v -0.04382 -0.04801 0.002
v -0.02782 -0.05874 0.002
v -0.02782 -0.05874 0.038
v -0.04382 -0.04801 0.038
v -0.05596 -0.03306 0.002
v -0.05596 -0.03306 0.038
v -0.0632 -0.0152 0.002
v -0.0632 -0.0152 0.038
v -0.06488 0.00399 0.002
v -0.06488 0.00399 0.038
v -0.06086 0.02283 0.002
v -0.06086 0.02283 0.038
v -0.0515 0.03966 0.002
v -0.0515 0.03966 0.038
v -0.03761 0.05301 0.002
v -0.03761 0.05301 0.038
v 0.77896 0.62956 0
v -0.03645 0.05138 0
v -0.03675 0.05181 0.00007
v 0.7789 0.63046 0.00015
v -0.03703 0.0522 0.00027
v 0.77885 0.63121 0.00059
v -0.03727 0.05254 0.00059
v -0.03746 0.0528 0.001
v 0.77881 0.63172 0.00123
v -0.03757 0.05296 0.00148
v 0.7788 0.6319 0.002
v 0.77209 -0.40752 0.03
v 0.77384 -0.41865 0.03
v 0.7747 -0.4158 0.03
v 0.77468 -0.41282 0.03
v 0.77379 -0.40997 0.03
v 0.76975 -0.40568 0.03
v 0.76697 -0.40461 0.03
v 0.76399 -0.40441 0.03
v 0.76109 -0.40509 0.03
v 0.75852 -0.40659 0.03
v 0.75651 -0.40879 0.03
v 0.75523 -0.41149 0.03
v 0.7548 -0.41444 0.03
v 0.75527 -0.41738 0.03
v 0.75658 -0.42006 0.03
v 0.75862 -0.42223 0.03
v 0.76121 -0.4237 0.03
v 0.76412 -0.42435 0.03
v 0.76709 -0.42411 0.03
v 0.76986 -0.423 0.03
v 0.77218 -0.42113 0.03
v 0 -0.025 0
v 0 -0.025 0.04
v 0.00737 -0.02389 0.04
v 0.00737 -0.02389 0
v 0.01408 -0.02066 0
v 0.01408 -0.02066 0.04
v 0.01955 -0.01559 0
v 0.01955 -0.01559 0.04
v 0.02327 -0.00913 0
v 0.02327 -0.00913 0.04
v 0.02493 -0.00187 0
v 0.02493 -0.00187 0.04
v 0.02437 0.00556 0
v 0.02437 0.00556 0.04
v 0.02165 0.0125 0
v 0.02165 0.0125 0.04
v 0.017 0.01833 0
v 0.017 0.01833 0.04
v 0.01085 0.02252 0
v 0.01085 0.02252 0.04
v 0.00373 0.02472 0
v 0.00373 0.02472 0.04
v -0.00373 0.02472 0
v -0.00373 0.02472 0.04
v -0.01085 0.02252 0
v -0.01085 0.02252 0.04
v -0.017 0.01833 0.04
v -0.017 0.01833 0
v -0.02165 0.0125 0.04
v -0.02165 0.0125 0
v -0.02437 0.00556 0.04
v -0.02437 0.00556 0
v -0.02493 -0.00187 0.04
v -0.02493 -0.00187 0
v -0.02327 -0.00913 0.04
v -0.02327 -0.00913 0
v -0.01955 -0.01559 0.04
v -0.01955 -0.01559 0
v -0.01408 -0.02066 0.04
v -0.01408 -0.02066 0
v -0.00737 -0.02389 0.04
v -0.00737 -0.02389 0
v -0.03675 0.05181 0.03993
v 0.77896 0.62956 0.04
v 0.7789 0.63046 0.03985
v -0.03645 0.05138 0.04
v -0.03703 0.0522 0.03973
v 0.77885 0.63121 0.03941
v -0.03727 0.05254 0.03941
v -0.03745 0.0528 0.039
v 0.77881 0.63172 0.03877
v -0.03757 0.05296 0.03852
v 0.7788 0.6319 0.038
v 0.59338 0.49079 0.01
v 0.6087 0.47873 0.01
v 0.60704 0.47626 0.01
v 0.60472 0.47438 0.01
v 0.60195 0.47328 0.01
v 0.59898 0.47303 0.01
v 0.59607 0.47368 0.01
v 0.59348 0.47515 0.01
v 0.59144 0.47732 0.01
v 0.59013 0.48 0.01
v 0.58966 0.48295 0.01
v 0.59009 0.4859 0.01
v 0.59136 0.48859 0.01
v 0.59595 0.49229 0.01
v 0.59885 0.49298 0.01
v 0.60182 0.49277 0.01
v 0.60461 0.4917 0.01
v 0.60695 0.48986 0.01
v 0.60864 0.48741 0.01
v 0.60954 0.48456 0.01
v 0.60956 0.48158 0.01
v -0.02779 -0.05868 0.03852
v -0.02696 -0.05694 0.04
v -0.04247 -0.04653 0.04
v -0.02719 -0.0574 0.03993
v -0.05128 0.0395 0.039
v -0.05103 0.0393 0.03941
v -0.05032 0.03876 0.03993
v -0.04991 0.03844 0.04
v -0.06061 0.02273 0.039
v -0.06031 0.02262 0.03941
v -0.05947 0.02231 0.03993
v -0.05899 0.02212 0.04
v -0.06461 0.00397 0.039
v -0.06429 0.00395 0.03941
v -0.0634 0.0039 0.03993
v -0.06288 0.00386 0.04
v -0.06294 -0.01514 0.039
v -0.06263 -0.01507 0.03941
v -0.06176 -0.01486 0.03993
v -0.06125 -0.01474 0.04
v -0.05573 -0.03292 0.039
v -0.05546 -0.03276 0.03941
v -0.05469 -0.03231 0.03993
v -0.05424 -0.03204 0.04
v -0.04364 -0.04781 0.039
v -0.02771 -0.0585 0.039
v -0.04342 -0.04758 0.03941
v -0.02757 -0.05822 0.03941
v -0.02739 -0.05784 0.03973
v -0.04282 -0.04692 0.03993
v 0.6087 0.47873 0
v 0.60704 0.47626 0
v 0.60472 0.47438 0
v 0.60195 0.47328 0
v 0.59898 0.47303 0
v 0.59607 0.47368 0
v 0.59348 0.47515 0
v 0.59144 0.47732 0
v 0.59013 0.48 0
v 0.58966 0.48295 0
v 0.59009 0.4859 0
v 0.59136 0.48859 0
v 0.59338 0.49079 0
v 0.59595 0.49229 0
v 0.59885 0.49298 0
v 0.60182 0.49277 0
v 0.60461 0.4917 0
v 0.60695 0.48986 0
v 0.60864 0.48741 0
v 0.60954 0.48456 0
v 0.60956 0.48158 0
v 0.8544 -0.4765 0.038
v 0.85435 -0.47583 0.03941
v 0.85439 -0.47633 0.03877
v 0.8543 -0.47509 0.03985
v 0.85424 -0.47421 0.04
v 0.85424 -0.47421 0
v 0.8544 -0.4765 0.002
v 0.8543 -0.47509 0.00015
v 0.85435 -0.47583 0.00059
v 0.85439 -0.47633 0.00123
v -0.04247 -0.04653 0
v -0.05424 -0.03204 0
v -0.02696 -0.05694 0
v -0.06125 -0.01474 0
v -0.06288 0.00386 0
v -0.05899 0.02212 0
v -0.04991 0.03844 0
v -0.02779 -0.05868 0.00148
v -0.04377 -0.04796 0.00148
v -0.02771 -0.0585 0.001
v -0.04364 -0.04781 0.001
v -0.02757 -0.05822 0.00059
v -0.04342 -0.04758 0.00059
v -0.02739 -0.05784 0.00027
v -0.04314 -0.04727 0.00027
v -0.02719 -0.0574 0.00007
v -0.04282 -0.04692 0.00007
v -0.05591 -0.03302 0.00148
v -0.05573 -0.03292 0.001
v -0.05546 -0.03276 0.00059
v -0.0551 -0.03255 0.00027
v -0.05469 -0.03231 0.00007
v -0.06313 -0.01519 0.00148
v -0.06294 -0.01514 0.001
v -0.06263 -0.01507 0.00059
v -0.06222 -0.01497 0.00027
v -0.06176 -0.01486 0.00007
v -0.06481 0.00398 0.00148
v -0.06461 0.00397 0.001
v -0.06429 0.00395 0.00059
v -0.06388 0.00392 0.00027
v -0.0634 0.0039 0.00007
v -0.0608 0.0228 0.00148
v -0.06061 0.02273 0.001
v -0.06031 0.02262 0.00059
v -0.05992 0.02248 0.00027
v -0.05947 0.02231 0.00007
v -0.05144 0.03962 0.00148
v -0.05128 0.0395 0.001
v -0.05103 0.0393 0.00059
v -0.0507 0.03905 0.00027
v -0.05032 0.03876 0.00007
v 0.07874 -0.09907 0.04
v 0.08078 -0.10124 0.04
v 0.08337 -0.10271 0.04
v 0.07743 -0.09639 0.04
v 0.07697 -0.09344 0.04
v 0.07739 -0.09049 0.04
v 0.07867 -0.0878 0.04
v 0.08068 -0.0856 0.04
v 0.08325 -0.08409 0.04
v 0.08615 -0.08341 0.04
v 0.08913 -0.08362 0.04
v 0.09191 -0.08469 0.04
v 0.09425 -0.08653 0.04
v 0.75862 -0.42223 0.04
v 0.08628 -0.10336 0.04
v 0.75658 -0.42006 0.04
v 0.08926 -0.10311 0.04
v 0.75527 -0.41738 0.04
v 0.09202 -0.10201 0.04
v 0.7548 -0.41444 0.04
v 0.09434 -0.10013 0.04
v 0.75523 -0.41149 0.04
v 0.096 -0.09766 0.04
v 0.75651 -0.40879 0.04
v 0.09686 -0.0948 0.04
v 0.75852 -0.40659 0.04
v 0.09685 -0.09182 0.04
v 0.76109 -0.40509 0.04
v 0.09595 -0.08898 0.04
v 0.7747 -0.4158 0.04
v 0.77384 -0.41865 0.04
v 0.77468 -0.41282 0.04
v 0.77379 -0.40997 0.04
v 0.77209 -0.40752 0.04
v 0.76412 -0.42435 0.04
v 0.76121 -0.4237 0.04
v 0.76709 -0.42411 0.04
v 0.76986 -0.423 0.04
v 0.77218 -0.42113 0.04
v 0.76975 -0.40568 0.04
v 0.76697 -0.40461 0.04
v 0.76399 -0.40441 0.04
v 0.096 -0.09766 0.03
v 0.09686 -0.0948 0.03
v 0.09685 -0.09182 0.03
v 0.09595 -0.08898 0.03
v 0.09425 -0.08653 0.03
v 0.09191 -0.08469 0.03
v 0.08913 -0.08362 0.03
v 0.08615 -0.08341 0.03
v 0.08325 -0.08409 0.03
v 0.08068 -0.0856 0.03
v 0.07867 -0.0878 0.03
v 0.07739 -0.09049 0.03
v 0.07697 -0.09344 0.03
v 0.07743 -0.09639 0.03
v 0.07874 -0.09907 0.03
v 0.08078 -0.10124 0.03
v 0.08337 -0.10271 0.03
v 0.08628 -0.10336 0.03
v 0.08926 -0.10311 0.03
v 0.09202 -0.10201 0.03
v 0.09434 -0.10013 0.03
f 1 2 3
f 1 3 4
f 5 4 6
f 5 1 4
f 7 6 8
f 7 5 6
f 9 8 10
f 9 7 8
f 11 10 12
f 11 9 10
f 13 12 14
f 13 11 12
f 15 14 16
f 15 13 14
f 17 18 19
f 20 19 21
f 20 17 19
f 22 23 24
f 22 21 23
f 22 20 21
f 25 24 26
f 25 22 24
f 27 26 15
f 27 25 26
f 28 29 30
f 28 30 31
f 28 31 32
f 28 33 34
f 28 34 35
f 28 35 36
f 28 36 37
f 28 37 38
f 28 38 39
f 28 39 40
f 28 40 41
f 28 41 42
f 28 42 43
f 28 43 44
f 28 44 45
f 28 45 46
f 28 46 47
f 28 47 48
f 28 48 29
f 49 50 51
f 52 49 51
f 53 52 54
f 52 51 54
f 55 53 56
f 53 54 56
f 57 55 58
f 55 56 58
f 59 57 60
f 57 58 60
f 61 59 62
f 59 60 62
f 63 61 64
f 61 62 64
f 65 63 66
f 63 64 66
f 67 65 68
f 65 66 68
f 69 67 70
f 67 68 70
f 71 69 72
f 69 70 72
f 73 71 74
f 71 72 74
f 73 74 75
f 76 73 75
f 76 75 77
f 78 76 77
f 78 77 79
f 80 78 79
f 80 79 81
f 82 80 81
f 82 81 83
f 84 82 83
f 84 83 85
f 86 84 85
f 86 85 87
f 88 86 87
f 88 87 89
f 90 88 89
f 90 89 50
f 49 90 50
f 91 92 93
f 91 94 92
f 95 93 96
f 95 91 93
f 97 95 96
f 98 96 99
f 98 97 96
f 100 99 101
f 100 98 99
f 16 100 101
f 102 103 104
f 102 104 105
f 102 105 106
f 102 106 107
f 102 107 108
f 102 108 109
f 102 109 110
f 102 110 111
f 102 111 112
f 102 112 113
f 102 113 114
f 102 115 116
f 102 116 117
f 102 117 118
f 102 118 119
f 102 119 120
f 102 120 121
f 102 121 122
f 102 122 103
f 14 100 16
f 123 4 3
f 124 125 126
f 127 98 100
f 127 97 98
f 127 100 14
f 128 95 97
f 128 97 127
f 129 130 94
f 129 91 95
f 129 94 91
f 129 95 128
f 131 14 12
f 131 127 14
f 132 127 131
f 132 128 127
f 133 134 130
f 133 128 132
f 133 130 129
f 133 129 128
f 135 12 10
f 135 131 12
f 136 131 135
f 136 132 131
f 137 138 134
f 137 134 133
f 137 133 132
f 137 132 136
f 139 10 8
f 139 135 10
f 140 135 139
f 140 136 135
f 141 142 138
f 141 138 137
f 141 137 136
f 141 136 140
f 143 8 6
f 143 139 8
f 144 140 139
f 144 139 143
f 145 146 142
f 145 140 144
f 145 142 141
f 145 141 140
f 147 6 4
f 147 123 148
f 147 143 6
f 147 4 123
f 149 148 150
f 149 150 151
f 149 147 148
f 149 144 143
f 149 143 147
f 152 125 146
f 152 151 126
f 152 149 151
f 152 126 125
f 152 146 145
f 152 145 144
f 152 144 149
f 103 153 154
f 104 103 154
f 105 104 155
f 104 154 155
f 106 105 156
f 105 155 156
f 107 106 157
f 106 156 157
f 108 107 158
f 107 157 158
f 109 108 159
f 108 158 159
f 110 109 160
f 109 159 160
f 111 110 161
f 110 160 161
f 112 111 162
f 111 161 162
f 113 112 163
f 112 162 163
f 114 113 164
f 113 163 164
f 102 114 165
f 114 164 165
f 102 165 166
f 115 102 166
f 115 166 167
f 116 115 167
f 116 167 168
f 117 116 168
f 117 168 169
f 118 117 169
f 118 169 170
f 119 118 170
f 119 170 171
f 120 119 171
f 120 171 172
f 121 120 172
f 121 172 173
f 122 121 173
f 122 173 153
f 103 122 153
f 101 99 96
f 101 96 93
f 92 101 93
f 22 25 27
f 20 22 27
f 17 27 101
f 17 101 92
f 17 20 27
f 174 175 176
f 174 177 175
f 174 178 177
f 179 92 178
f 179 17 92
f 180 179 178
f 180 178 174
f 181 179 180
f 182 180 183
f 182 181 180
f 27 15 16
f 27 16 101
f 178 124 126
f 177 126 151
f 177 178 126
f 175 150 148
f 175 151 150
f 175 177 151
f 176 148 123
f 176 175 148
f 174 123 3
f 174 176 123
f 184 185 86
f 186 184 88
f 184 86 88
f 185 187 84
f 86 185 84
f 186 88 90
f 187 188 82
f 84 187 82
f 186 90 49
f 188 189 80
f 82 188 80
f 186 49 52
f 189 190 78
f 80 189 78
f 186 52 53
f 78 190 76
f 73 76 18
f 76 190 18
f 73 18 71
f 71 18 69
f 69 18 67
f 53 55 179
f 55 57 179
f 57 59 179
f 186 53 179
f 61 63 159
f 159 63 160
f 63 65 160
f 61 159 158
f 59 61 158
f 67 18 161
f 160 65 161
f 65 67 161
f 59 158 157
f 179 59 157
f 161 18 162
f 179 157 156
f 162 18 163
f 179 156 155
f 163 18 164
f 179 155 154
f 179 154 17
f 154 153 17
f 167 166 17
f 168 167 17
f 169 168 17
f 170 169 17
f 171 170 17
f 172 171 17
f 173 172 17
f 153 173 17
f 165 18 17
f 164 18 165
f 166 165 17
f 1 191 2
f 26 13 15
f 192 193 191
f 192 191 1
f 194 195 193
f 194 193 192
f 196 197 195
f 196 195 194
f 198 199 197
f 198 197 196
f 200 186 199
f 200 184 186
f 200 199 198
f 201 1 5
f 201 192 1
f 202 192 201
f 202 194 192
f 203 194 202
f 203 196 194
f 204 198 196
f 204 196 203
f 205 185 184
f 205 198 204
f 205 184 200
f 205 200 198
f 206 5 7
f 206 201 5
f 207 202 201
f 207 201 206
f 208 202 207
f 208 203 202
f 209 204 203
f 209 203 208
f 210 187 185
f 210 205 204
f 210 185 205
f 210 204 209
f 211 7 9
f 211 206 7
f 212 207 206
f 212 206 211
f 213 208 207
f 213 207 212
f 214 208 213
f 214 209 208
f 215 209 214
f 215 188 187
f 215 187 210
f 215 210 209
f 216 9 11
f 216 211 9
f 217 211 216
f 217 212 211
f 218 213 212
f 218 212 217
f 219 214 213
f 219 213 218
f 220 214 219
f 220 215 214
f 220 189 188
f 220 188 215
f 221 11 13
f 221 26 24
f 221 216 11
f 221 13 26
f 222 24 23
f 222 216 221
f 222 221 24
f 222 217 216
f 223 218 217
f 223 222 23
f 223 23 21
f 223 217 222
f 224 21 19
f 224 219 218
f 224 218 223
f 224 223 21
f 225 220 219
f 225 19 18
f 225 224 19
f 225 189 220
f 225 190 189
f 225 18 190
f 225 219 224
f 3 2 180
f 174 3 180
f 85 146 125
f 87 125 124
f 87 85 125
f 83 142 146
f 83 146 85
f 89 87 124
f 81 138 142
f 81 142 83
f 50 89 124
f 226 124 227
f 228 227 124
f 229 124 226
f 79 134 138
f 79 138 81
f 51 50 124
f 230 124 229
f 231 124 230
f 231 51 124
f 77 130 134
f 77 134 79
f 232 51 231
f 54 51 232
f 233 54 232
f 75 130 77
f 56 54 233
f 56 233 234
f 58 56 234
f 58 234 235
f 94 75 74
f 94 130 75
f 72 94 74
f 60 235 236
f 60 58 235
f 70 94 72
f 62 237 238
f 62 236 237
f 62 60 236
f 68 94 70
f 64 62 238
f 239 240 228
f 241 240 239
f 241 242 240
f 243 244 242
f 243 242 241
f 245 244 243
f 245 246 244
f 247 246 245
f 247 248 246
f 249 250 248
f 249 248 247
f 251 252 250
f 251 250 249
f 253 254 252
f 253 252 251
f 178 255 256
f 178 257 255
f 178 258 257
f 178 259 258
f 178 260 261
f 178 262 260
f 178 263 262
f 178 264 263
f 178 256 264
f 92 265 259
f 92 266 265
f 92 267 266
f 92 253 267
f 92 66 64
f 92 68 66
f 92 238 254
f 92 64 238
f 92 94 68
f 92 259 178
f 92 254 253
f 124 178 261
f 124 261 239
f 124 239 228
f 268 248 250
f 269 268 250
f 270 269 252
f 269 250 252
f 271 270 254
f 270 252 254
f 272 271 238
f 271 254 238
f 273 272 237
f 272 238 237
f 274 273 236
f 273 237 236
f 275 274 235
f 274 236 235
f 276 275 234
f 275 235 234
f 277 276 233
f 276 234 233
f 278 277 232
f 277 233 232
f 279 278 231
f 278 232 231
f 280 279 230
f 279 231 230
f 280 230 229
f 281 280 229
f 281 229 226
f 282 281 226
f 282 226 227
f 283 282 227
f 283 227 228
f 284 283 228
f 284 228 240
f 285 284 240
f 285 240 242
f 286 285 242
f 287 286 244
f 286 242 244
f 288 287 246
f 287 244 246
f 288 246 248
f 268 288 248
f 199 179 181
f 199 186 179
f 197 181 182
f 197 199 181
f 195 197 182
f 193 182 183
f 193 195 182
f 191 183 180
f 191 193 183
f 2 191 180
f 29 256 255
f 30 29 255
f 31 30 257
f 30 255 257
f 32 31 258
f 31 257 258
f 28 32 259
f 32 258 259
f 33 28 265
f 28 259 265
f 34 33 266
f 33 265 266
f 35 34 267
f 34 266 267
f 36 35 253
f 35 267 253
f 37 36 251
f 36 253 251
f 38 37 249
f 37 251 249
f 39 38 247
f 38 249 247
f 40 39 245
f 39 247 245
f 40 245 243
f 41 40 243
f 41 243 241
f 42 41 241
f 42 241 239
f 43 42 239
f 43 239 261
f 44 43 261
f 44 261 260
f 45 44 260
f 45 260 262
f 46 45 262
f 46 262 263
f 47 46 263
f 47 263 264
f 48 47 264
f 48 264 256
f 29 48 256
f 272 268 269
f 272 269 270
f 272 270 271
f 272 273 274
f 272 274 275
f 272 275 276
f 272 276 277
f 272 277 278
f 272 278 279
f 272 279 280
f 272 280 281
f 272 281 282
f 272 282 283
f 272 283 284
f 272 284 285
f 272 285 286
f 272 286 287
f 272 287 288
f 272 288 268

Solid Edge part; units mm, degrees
sketch "Sketch1" plane through (0, 0, 0) normal (0, 0, 1) x (1, 0, 0)
  line L0 (-0.0278, -0.0587) -> (0.8544, -0.4765)
  line L1 (0.7788, 0.6319) -> (0.8544, -0.4765)
  line L2 (-0.0376, 0.053) -> (0.7788, 0.6319)
  arc A0 (-0.0278, -0.0587) -> (-0.0376, 0.053) centre (0, 0) cw
extrude "Protrusion1" add sketch "Sketch1" along normal blind 0.04
sketch "Sketch2" plane through (0.3475, 0, 0.04) normal (0, 0, 1) x (0.9038, -0.428, 0)
  circle A0 centre (-0.1955, -0.1959) radius 0.01
  circle A1 centre (0.5545, -0.1959) radius 0.01
  dimension "D1" = 0.5545
extrude "Ausschnitt_1" cut sketch "Sketch2" against normal blind 0.01
sketch "Sketch3" plane through (0.3675, 0, 0) normal (0, 0, -1) x (0.9038, -0.428, 0)
  circle A0 centre (0.0031, -0.5359) radius 0.01
  dimension "D1" = 0.02
  dimension "D2" = 0.77
extrude "Ausschnitt_2" cut sketch "Sketch3" against normal blind 0.01
sketch "Sketch4" plane through (0.3675, 0, 0.04) normal (0, 0, 1) x (0, -1, 0)
  circle A0 centre (0, -0.3675) radius 0.025
  dimension "D1" = 0.05
extrude "Cutout1" cut sketch "Sketch4" against normal through all
fillet "Verrundung_1" radius 0.002 6 edges at (0.4133, -0.2676, 0.04) (-0.0648, -0.0057, 0.04) (0.3706, 0.3425, 0.04) (-0.0648, -0.0057, 0) (0.3706, 0.3425, 0) (0.4133, -0.2676, 0)
